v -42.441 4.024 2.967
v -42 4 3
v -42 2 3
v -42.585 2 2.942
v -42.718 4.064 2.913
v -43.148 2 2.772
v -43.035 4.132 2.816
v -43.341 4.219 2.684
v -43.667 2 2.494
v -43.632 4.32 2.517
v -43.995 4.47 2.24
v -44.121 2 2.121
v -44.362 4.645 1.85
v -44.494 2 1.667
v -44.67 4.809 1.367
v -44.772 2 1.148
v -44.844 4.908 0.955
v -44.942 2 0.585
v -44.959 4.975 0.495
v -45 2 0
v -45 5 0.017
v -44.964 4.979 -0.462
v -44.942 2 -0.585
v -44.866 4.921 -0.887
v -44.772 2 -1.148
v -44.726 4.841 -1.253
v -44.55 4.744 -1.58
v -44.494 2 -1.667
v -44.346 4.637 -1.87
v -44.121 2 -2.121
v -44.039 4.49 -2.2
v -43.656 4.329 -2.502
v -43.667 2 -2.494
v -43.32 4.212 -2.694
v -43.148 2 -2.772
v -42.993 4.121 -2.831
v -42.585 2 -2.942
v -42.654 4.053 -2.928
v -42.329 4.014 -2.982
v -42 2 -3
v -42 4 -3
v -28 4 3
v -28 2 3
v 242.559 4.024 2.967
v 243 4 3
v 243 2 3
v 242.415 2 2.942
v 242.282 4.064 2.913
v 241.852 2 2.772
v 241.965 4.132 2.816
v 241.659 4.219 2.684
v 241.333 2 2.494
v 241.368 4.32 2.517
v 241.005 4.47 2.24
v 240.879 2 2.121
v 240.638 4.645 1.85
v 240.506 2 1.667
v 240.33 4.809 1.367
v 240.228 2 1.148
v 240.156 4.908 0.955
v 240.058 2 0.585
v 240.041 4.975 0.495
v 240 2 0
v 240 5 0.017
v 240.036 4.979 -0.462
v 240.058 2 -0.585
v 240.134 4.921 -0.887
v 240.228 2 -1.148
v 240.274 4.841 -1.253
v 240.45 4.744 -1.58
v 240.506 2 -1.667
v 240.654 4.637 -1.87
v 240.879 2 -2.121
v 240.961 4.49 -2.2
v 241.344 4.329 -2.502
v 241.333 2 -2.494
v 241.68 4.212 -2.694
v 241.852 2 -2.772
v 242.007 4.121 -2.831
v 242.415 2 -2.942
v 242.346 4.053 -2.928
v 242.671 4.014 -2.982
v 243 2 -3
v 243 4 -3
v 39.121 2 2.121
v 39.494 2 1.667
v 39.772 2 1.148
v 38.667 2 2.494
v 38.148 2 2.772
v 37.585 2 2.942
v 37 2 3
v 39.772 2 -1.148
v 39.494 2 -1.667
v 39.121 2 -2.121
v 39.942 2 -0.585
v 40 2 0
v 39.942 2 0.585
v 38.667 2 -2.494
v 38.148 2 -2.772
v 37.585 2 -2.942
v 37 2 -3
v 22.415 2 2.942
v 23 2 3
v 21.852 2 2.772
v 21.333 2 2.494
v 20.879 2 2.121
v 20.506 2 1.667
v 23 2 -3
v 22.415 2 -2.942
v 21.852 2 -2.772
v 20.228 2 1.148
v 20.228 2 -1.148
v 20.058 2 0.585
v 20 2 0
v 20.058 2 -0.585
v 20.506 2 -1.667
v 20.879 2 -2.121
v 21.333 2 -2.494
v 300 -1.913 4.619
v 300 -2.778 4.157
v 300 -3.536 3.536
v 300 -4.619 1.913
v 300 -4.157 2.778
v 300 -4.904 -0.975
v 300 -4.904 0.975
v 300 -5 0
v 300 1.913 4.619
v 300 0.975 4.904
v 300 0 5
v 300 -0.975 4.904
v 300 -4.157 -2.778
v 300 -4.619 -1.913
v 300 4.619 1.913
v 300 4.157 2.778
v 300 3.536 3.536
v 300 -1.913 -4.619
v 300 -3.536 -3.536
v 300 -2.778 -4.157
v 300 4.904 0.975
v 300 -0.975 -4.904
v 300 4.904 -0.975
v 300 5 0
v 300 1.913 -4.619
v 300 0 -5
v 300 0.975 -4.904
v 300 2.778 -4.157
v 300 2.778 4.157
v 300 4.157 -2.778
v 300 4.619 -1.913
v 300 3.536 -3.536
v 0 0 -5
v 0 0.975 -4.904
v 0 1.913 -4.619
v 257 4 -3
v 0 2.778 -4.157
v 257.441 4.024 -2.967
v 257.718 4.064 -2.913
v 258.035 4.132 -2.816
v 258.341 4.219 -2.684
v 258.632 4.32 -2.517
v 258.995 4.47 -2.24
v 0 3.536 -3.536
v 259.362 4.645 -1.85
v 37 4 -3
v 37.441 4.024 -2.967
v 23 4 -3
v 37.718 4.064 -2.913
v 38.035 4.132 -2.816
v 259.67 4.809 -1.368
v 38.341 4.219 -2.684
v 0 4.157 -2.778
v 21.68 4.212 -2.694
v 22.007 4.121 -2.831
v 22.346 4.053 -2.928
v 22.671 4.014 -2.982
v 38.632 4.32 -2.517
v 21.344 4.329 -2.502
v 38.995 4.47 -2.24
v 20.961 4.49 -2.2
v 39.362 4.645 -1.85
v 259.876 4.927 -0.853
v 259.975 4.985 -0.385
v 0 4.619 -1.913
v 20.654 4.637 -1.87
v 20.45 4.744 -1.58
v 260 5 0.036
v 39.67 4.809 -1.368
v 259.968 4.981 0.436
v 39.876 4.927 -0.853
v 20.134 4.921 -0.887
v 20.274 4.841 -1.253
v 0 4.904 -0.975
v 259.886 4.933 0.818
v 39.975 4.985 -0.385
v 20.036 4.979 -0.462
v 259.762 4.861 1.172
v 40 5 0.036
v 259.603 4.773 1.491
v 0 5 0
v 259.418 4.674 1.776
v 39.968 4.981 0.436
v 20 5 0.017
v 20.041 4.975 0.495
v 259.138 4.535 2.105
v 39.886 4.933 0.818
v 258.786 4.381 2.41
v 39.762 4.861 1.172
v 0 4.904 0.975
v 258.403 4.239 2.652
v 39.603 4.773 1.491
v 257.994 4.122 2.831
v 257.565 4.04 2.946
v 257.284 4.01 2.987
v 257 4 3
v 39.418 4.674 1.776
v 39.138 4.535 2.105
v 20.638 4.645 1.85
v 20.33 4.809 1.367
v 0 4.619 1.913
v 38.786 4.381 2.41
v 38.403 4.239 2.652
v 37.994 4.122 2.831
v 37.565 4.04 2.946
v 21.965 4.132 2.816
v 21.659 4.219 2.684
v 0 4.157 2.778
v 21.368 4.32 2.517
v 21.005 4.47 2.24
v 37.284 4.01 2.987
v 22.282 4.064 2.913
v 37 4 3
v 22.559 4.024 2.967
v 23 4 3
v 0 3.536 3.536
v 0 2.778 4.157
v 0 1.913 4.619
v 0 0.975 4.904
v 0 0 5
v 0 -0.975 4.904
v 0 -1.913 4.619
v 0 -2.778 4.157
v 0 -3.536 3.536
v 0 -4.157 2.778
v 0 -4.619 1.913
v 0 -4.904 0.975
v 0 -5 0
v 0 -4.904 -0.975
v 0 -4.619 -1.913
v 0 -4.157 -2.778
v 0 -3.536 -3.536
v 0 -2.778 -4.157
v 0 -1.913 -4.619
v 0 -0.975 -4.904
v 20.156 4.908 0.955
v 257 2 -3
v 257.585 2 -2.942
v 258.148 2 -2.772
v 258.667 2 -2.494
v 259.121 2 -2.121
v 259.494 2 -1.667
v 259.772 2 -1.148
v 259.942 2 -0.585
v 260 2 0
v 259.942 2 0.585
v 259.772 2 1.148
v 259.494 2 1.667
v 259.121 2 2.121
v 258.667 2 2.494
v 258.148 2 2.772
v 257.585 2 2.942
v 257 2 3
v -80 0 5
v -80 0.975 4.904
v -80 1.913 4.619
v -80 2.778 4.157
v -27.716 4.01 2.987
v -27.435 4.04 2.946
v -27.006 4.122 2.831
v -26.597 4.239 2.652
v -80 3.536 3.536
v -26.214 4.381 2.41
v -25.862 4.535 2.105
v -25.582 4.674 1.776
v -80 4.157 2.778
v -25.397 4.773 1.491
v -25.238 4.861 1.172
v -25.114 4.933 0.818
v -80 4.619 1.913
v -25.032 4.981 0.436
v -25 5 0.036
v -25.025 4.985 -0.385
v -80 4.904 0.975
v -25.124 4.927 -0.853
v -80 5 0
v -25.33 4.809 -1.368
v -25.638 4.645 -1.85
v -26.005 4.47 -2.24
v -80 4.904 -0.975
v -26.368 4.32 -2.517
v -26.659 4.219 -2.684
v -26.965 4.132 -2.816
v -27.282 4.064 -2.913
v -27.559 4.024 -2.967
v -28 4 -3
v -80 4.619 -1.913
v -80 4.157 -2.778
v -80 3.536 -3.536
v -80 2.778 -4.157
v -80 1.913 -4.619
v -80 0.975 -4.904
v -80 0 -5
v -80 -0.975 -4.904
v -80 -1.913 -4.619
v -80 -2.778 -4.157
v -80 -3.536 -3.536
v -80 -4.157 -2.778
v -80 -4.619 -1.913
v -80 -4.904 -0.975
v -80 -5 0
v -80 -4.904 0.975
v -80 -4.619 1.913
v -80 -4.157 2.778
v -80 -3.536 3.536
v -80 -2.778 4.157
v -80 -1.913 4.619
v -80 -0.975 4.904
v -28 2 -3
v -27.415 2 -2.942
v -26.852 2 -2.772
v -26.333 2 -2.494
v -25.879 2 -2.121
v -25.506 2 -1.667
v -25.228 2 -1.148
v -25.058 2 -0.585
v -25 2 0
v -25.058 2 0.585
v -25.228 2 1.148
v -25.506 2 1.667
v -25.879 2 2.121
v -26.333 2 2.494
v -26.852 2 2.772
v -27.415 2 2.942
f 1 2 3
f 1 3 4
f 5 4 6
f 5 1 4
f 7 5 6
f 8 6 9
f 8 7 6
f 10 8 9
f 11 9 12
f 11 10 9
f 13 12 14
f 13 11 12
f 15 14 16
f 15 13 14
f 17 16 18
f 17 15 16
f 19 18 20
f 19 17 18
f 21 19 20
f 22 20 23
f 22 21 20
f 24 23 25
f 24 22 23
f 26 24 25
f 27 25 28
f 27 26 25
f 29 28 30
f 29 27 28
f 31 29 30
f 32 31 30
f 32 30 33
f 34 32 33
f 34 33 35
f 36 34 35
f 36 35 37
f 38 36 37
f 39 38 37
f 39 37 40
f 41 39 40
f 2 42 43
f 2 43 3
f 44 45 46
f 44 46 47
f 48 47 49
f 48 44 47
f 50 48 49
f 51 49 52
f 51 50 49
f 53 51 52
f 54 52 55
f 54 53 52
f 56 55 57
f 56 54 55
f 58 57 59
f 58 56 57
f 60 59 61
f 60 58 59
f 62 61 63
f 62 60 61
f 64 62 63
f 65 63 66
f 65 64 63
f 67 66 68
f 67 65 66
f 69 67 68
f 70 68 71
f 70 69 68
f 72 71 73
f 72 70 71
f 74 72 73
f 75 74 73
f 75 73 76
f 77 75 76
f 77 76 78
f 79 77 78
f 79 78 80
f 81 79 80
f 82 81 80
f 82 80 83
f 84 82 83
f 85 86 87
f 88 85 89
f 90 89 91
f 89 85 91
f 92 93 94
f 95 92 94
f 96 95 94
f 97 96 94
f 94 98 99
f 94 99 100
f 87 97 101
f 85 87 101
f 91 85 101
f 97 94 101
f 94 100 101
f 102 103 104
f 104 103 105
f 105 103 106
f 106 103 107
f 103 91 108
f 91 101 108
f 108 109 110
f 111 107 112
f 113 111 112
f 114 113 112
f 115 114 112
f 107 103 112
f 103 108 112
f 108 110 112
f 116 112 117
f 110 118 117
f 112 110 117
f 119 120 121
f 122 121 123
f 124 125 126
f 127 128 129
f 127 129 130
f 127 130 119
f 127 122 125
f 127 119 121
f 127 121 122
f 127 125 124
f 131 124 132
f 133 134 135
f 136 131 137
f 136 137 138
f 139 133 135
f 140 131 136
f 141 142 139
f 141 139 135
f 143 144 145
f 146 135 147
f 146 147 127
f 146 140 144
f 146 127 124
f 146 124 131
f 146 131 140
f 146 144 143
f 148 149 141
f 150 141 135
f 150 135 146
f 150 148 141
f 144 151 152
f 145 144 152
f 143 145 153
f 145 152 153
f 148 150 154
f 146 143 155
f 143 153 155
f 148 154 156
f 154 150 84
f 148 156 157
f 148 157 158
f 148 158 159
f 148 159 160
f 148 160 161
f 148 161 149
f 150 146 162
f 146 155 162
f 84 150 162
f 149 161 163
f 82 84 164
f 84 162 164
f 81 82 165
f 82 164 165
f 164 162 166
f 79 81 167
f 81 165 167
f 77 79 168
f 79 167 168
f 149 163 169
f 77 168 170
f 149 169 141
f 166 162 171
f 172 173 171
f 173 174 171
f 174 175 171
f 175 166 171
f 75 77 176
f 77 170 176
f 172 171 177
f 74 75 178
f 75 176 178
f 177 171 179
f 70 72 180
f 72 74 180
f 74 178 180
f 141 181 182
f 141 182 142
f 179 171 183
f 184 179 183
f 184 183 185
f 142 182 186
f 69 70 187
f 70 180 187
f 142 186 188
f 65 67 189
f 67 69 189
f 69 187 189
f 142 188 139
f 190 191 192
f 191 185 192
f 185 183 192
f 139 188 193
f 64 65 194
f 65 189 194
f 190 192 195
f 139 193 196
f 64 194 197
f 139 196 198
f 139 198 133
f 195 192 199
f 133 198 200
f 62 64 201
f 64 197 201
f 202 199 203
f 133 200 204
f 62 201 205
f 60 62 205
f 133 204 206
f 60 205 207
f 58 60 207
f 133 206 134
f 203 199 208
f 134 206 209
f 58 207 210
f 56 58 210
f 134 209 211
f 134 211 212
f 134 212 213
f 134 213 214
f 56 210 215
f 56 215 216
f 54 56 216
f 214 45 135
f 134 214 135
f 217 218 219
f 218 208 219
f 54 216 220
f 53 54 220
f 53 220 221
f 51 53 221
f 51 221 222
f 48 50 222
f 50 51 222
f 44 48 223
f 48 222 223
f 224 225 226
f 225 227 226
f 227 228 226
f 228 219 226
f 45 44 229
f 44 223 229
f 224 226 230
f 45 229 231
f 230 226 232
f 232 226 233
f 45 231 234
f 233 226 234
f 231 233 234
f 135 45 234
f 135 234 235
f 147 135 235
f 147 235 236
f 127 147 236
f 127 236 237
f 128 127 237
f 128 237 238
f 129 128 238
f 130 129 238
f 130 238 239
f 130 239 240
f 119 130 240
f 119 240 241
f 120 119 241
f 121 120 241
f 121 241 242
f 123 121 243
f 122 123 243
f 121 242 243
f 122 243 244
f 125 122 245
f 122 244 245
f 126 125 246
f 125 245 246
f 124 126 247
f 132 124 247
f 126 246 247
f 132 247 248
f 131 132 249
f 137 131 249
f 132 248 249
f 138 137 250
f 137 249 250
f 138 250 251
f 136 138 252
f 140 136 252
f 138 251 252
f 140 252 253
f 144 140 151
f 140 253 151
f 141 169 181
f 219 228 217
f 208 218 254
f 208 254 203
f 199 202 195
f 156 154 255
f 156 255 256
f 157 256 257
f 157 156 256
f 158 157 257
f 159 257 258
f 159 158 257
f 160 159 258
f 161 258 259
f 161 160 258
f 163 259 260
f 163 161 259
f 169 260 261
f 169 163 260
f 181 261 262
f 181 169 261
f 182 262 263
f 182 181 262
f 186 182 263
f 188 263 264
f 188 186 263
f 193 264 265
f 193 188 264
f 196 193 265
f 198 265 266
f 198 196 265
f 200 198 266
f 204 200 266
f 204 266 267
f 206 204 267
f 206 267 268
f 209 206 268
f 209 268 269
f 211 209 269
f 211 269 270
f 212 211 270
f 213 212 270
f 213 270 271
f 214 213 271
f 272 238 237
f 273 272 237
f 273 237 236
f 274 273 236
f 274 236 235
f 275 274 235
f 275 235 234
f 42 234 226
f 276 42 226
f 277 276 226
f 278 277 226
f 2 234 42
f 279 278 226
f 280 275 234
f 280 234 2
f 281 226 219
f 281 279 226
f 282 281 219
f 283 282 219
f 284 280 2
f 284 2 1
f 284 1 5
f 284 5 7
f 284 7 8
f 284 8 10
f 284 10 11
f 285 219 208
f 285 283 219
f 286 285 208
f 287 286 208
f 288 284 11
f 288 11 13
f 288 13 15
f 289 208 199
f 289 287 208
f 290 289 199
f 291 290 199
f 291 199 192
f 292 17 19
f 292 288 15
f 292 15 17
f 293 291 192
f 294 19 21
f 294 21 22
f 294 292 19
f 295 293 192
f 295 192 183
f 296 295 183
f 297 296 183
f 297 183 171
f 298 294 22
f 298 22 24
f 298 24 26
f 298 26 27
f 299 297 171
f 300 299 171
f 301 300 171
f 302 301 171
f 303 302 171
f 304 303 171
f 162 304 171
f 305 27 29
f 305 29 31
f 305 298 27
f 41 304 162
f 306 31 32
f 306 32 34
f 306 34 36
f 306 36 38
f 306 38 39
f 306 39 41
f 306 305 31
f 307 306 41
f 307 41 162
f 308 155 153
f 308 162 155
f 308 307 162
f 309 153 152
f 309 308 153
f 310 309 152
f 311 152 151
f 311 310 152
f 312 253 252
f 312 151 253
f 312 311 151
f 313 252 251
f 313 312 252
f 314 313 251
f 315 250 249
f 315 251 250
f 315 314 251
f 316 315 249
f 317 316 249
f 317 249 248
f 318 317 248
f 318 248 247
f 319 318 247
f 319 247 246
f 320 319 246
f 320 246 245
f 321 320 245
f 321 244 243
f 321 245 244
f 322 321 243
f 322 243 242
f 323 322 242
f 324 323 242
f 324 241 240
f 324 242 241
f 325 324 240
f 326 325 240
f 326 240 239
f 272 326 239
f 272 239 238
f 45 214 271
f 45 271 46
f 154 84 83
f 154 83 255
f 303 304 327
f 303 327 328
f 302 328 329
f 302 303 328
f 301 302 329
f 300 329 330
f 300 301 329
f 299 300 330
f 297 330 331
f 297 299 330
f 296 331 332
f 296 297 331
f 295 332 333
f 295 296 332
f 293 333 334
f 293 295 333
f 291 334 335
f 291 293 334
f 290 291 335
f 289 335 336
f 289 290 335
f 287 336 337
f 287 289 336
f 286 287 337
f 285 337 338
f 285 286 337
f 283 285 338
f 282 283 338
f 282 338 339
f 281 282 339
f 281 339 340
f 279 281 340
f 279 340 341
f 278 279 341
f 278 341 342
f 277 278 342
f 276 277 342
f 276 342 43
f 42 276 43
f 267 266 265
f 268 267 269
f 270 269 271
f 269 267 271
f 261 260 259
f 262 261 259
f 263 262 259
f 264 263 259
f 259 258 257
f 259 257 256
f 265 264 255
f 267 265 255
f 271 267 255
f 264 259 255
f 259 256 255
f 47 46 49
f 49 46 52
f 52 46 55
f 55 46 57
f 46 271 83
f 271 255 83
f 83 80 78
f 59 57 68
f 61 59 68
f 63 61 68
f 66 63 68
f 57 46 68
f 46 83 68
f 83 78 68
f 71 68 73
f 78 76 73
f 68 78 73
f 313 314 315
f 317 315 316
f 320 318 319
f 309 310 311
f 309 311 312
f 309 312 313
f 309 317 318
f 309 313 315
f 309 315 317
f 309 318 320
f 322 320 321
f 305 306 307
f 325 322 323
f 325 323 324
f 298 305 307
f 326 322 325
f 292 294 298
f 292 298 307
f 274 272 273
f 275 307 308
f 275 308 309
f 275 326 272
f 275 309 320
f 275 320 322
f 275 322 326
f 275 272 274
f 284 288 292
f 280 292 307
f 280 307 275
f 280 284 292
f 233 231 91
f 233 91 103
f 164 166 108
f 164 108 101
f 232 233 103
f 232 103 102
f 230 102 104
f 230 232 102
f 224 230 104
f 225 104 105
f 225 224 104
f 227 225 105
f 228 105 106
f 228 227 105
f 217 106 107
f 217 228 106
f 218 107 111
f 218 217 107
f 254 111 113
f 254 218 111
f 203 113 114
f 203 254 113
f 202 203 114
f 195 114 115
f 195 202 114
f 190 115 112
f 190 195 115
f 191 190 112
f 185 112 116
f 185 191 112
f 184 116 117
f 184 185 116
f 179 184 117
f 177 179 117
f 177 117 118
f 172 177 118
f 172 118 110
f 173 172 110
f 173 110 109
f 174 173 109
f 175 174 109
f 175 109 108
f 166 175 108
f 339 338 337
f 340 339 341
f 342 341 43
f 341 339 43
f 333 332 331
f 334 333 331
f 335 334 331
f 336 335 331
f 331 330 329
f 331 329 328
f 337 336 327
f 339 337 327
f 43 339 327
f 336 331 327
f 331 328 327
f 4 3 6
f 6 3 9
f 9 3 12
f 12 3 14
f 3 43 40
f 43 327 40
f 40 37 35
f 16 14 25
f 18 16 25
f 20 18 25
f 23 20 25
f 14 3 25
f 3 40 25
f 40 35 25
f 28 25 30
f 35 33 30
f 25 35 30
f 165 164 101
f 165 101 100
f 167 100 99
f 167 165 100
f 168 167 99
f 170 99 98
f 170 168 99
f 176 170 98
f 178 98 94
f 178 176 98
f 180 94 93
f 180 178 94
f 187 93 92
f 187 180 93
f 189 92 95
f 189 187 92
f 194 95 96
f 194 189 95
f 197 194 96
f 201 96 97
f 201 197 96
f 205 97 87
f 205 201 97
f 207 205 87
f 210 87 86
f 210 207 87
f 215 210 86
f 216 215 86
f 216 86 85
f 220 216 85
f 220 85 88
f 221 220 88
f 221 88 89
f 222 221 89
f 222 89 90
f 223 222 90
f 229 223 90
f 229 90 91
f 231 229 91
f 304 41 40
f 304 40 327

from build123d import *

# Parameters (mm, degrees)
SKETCH_1_R             = 5
EXTRUDE_1_DEPTH        = 150
CUT_EXTRUDE_1_DEPTH    = 3
SKETCH_3_R             = 5
EXTRUDE_2_DEPTH        = 150
CUT_EXTRUDE_2_DEPTH    = 3
EXTRUDE_START          = 80
SKETCH_5_R             = 5
EXTRUDE_4_DEPTH        = 80
PATTERN_LINEAR_2_COUNT = 2
PATTERN_LINEAR_2_PITCH = 65


with BuildPart() as part:
    # 草图1 → 凸台-拉伸1 (new body)
    with BuildSketch(Plane(origin=(0, 0, 0), x_dir=(0, 0, -1), z_dir=(1, 0, 0))):
        Circle(SKETCH_1_R)
    extrude(amount=EXTRUDE_1_DEPTH)

    # 草图2 → 切除-拉伸1 (cut)
    with BuildSketch(Plane(origin=(0, 5, 0), x_dir=(1, 0, 0), z_dir=(0, 1, 0))):
        with BuildLine():
            Line((23, 3), (37, 3))
            ThreePointArc((37, 3), (40, 0), (37, -3))
            Line((37, -3), (23, -3))
            ThreePointArc((23, -3), (20, 0), (23, 3))
        make_face()
    cut_extrude_1 = extrude(amount=-CUT_EXTRUDE_1_DEPTH, mode=Mode.SUBTRACT)

    # 草图3 → 凸台-拉伸2 (add)
    with BuildSketch(Plane(origin=(150, 0, 0), x_dir=(0, 0, -1), z_dir=(1, 0, 0))):
        Circle(SKETCH_3_R)
    extrude(amount=EXTRUDE_2_DEPTH)

    # 草图4 → 切除-拉伸2 (cut)
    with BuildSketch(Plane(origin=(0, 5, 0), x_dir=(1, 0, 0), z_dir=(0, 1, 0))):
        with BuildLine():
            Line((243, 3), (257, 3))
            ThreePointArc((257, 3), (260, 0), (257, -3))
            Line((257, -3), (243, -3))
            ThreePointArc((243, -3), (240, 0), (243, 3))
        make_face()
    extrude(amount=-CUT_EXTRUDE_2_DEPTH, mode=Mode.SUBTRACT)

    # 草图5 → 凸台-拉伸4 (add)
    with BuildSketch(Plane.ZY.offset(EXTRUDE_START)):
        Circle(SKETCH_5_R)
    extrude(amount=-EXTRUDE_4_DEPTH)

    # 阵列(线性)2: 切除-拉伸1 ×2
    with Locations(*[(-i * PATTERN_LINEAR_2_PITCH, 0, 0) for i in range(1, PATTERN_LINEAR_2_COUNT)]):
        add(cut_extrude_1, mode=Mode.SUBTRACT)


solid = part.part
